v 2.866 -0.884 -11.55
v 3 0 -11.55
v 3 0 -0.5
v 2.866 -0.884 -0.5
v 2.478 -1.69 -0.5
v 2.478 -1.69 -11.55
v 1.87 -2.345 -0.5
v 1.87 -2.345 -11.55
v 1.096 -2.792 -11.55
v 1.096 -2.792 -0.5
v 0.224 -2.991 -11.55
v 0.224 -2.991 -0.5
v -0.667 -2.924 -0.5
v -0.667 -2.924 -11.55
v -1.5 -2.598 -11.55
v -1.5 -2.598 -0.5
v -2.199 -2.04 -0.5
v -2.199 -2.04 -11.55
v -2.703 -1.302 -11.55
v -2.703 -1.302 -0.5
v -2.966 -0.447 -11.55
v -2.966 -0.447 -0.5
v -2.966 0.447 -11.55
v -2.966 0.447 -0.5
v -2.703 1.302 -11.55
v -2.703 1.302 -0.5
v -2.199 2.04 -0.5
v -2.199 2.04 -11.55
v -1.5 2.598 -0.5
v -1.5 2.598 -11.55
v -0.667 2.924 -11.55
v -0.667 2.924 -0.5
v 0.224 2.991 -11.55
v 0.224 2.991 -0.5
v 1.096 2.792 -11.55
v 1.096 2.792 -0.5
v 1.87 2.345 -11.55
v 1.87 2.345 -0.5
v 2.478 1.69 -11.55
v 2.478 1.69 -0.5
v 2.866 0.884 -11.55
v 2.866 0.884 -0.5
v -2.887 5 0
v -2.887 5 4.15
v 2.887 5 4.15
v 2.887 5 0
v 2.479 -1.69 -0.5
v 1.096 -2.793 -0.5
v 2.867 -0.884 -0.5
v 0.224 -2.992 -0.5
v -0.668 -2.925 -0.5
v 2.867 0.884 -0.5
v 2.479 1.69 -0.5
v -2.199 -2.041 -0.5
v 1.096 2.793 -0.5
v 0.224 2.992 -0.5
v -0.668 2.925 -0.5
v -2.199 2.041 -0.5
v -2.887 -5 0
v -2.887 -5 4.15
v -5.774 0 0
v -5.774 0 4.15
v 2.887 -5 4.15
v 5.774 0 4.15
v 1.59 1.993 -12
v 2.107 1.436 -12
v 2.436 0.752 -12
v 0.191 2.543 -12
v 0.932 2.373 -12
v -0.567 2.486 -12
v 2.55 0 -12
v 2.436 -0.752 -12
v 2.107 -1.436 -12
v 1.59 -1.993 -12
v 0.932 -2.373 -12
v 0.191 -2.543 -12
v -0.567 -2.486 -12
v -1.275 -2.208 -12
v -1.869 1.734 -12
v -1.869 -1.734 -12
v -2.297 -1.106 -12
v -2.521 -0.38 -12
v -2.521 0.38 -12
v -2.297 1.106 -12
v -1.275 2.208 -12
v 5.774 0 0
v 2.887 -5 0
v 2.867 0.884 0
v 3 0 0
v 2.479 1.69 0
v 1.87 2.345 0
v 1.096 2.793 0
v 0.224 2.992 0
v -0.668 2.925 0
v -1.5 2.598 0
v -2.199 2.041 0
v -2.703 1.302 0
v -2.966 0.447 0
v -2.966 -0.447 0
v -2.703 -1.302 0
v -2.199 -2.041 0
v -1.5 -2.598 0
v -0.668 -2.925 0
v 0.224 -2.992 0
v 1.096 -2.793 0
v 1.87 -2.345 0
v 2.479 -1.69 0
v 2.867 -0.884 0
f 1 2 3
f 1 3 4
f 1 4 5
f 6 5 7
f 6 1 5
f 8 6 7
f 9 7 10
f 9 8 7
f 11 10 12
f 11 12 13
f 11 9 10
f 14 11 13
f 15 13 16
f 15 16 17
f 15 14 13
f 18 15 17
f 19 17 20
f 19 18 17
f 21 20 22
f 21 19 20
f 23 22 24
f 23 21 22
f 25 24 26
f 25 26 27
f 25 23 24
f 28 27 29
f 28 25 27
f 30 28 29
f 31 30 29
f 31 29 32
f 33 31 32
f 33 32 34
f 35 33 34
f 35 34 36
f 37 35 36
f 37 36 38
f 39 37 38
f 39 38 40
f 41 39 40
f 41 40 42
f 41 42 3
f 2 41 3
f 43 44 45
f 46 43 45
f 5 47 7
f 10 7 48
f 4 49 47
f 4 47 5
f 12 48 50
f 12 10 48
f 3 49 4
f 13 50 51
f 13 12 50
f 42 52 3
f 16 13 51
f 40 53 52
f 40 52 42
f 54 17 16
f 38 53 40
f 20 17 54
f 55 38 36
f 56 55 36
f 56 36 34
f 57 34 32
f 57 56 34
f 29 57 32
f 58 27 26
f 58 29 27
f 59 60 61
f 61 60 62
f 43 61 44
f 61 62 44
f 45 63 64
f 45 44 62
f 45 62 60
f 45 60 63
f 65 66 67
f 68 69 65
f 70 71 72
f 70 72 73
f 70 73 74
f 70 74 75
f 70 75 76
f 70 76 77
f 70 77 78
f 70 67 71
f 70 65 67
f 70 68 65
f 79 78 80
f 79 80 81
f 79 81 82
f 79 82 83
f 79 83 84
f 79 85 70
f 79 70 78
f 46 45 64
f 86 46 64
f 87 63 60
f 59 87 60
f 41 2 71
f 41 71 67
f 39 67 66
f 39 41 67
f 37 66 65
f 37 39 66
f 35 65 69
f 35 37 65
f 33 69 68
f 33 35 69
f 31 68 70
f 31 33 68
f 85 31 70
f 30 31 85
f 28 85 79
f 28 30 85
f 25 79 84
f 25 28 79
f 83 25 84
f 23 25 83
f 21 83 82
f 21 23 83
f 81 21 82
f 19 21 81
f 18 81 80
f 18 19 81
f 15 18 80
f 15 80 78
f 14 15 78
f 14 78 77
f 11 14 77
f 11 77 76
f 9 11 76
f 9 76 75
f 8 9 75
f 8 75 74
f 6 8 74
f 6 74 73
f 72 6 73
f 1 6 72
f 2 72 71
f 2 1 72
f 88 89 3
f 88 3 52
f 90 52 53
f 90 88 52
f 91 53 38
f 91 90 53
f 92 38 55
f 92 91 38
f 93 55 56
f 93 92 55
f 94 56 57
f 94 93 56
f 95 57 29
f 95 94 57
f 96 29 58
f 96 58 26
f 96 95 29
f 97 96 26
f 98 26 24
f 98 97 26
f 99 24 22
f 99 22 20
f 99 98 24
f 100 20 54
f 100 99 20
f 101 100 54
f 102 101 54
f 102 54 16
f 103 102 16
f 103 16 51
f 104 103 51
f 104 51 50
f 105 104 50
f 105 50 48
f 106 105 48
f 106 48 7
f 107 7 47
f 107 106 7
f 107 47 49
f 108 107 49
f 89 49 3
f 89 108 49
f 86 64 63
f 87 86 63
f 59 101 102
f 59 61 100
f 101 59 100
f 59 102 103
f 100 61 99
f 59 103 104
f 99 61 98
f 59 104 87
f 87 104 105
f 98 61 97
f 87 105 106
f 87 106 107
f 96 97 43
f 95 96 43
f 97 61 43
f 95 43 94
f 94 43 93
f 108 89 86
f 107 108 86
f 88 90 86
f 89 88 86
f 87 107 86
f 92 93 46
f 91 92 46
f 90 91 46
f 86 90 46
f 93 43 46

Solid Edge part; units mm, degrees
sketch "Sketch1" plane through (0, 0, 0) normal (0, 0, 1) x (1, 0, 0)
  circle A0 centre (0, 0) radius 5.8
  dimension "D1" = 11.6
extrude "Protrusion1" add sketch "Sketch1" along normal blind 4.15
sketch "Sketch2" plane through (0, 0, 0) normal (0, 0, -1) x (1, 0, 0)
  circle A0 centre (0, 0) radius 3
extrude "Protrusion2" add sketch "Sketch2" along normal blind 12
sketch "Sketch3" plane through (0, 0, -12) normal (0, 0, -1) x (1, 0, 0)
  circle A0 centre (0, 0) radius 2.9997
extrude "Cutout1" cut sketch "Sketch3" against normal blind 11.5 flip side to cut
chamfer "Chamfer_1" distance 0.45 angle 45 1 edges at (-2.9997, 0, -12)
sketch "Sketch4" plane through (0, 0, 4.15) normal (0, 0, 1) x (1, 0, 0)
  line L0 (-2.9394, 5) -> (2.9394, 5)
  dimension "D1" = 10
extrude "Cutout2" cut sketch "Sketch4" against normal up to next material side at (0, 5.05, 4.15)
pattern_circular "Pattern1" count 6 over 360 about axis through (0, 0, 4.15) along (0, 0, 1) of "Cutout2"
properties part number "118623"
